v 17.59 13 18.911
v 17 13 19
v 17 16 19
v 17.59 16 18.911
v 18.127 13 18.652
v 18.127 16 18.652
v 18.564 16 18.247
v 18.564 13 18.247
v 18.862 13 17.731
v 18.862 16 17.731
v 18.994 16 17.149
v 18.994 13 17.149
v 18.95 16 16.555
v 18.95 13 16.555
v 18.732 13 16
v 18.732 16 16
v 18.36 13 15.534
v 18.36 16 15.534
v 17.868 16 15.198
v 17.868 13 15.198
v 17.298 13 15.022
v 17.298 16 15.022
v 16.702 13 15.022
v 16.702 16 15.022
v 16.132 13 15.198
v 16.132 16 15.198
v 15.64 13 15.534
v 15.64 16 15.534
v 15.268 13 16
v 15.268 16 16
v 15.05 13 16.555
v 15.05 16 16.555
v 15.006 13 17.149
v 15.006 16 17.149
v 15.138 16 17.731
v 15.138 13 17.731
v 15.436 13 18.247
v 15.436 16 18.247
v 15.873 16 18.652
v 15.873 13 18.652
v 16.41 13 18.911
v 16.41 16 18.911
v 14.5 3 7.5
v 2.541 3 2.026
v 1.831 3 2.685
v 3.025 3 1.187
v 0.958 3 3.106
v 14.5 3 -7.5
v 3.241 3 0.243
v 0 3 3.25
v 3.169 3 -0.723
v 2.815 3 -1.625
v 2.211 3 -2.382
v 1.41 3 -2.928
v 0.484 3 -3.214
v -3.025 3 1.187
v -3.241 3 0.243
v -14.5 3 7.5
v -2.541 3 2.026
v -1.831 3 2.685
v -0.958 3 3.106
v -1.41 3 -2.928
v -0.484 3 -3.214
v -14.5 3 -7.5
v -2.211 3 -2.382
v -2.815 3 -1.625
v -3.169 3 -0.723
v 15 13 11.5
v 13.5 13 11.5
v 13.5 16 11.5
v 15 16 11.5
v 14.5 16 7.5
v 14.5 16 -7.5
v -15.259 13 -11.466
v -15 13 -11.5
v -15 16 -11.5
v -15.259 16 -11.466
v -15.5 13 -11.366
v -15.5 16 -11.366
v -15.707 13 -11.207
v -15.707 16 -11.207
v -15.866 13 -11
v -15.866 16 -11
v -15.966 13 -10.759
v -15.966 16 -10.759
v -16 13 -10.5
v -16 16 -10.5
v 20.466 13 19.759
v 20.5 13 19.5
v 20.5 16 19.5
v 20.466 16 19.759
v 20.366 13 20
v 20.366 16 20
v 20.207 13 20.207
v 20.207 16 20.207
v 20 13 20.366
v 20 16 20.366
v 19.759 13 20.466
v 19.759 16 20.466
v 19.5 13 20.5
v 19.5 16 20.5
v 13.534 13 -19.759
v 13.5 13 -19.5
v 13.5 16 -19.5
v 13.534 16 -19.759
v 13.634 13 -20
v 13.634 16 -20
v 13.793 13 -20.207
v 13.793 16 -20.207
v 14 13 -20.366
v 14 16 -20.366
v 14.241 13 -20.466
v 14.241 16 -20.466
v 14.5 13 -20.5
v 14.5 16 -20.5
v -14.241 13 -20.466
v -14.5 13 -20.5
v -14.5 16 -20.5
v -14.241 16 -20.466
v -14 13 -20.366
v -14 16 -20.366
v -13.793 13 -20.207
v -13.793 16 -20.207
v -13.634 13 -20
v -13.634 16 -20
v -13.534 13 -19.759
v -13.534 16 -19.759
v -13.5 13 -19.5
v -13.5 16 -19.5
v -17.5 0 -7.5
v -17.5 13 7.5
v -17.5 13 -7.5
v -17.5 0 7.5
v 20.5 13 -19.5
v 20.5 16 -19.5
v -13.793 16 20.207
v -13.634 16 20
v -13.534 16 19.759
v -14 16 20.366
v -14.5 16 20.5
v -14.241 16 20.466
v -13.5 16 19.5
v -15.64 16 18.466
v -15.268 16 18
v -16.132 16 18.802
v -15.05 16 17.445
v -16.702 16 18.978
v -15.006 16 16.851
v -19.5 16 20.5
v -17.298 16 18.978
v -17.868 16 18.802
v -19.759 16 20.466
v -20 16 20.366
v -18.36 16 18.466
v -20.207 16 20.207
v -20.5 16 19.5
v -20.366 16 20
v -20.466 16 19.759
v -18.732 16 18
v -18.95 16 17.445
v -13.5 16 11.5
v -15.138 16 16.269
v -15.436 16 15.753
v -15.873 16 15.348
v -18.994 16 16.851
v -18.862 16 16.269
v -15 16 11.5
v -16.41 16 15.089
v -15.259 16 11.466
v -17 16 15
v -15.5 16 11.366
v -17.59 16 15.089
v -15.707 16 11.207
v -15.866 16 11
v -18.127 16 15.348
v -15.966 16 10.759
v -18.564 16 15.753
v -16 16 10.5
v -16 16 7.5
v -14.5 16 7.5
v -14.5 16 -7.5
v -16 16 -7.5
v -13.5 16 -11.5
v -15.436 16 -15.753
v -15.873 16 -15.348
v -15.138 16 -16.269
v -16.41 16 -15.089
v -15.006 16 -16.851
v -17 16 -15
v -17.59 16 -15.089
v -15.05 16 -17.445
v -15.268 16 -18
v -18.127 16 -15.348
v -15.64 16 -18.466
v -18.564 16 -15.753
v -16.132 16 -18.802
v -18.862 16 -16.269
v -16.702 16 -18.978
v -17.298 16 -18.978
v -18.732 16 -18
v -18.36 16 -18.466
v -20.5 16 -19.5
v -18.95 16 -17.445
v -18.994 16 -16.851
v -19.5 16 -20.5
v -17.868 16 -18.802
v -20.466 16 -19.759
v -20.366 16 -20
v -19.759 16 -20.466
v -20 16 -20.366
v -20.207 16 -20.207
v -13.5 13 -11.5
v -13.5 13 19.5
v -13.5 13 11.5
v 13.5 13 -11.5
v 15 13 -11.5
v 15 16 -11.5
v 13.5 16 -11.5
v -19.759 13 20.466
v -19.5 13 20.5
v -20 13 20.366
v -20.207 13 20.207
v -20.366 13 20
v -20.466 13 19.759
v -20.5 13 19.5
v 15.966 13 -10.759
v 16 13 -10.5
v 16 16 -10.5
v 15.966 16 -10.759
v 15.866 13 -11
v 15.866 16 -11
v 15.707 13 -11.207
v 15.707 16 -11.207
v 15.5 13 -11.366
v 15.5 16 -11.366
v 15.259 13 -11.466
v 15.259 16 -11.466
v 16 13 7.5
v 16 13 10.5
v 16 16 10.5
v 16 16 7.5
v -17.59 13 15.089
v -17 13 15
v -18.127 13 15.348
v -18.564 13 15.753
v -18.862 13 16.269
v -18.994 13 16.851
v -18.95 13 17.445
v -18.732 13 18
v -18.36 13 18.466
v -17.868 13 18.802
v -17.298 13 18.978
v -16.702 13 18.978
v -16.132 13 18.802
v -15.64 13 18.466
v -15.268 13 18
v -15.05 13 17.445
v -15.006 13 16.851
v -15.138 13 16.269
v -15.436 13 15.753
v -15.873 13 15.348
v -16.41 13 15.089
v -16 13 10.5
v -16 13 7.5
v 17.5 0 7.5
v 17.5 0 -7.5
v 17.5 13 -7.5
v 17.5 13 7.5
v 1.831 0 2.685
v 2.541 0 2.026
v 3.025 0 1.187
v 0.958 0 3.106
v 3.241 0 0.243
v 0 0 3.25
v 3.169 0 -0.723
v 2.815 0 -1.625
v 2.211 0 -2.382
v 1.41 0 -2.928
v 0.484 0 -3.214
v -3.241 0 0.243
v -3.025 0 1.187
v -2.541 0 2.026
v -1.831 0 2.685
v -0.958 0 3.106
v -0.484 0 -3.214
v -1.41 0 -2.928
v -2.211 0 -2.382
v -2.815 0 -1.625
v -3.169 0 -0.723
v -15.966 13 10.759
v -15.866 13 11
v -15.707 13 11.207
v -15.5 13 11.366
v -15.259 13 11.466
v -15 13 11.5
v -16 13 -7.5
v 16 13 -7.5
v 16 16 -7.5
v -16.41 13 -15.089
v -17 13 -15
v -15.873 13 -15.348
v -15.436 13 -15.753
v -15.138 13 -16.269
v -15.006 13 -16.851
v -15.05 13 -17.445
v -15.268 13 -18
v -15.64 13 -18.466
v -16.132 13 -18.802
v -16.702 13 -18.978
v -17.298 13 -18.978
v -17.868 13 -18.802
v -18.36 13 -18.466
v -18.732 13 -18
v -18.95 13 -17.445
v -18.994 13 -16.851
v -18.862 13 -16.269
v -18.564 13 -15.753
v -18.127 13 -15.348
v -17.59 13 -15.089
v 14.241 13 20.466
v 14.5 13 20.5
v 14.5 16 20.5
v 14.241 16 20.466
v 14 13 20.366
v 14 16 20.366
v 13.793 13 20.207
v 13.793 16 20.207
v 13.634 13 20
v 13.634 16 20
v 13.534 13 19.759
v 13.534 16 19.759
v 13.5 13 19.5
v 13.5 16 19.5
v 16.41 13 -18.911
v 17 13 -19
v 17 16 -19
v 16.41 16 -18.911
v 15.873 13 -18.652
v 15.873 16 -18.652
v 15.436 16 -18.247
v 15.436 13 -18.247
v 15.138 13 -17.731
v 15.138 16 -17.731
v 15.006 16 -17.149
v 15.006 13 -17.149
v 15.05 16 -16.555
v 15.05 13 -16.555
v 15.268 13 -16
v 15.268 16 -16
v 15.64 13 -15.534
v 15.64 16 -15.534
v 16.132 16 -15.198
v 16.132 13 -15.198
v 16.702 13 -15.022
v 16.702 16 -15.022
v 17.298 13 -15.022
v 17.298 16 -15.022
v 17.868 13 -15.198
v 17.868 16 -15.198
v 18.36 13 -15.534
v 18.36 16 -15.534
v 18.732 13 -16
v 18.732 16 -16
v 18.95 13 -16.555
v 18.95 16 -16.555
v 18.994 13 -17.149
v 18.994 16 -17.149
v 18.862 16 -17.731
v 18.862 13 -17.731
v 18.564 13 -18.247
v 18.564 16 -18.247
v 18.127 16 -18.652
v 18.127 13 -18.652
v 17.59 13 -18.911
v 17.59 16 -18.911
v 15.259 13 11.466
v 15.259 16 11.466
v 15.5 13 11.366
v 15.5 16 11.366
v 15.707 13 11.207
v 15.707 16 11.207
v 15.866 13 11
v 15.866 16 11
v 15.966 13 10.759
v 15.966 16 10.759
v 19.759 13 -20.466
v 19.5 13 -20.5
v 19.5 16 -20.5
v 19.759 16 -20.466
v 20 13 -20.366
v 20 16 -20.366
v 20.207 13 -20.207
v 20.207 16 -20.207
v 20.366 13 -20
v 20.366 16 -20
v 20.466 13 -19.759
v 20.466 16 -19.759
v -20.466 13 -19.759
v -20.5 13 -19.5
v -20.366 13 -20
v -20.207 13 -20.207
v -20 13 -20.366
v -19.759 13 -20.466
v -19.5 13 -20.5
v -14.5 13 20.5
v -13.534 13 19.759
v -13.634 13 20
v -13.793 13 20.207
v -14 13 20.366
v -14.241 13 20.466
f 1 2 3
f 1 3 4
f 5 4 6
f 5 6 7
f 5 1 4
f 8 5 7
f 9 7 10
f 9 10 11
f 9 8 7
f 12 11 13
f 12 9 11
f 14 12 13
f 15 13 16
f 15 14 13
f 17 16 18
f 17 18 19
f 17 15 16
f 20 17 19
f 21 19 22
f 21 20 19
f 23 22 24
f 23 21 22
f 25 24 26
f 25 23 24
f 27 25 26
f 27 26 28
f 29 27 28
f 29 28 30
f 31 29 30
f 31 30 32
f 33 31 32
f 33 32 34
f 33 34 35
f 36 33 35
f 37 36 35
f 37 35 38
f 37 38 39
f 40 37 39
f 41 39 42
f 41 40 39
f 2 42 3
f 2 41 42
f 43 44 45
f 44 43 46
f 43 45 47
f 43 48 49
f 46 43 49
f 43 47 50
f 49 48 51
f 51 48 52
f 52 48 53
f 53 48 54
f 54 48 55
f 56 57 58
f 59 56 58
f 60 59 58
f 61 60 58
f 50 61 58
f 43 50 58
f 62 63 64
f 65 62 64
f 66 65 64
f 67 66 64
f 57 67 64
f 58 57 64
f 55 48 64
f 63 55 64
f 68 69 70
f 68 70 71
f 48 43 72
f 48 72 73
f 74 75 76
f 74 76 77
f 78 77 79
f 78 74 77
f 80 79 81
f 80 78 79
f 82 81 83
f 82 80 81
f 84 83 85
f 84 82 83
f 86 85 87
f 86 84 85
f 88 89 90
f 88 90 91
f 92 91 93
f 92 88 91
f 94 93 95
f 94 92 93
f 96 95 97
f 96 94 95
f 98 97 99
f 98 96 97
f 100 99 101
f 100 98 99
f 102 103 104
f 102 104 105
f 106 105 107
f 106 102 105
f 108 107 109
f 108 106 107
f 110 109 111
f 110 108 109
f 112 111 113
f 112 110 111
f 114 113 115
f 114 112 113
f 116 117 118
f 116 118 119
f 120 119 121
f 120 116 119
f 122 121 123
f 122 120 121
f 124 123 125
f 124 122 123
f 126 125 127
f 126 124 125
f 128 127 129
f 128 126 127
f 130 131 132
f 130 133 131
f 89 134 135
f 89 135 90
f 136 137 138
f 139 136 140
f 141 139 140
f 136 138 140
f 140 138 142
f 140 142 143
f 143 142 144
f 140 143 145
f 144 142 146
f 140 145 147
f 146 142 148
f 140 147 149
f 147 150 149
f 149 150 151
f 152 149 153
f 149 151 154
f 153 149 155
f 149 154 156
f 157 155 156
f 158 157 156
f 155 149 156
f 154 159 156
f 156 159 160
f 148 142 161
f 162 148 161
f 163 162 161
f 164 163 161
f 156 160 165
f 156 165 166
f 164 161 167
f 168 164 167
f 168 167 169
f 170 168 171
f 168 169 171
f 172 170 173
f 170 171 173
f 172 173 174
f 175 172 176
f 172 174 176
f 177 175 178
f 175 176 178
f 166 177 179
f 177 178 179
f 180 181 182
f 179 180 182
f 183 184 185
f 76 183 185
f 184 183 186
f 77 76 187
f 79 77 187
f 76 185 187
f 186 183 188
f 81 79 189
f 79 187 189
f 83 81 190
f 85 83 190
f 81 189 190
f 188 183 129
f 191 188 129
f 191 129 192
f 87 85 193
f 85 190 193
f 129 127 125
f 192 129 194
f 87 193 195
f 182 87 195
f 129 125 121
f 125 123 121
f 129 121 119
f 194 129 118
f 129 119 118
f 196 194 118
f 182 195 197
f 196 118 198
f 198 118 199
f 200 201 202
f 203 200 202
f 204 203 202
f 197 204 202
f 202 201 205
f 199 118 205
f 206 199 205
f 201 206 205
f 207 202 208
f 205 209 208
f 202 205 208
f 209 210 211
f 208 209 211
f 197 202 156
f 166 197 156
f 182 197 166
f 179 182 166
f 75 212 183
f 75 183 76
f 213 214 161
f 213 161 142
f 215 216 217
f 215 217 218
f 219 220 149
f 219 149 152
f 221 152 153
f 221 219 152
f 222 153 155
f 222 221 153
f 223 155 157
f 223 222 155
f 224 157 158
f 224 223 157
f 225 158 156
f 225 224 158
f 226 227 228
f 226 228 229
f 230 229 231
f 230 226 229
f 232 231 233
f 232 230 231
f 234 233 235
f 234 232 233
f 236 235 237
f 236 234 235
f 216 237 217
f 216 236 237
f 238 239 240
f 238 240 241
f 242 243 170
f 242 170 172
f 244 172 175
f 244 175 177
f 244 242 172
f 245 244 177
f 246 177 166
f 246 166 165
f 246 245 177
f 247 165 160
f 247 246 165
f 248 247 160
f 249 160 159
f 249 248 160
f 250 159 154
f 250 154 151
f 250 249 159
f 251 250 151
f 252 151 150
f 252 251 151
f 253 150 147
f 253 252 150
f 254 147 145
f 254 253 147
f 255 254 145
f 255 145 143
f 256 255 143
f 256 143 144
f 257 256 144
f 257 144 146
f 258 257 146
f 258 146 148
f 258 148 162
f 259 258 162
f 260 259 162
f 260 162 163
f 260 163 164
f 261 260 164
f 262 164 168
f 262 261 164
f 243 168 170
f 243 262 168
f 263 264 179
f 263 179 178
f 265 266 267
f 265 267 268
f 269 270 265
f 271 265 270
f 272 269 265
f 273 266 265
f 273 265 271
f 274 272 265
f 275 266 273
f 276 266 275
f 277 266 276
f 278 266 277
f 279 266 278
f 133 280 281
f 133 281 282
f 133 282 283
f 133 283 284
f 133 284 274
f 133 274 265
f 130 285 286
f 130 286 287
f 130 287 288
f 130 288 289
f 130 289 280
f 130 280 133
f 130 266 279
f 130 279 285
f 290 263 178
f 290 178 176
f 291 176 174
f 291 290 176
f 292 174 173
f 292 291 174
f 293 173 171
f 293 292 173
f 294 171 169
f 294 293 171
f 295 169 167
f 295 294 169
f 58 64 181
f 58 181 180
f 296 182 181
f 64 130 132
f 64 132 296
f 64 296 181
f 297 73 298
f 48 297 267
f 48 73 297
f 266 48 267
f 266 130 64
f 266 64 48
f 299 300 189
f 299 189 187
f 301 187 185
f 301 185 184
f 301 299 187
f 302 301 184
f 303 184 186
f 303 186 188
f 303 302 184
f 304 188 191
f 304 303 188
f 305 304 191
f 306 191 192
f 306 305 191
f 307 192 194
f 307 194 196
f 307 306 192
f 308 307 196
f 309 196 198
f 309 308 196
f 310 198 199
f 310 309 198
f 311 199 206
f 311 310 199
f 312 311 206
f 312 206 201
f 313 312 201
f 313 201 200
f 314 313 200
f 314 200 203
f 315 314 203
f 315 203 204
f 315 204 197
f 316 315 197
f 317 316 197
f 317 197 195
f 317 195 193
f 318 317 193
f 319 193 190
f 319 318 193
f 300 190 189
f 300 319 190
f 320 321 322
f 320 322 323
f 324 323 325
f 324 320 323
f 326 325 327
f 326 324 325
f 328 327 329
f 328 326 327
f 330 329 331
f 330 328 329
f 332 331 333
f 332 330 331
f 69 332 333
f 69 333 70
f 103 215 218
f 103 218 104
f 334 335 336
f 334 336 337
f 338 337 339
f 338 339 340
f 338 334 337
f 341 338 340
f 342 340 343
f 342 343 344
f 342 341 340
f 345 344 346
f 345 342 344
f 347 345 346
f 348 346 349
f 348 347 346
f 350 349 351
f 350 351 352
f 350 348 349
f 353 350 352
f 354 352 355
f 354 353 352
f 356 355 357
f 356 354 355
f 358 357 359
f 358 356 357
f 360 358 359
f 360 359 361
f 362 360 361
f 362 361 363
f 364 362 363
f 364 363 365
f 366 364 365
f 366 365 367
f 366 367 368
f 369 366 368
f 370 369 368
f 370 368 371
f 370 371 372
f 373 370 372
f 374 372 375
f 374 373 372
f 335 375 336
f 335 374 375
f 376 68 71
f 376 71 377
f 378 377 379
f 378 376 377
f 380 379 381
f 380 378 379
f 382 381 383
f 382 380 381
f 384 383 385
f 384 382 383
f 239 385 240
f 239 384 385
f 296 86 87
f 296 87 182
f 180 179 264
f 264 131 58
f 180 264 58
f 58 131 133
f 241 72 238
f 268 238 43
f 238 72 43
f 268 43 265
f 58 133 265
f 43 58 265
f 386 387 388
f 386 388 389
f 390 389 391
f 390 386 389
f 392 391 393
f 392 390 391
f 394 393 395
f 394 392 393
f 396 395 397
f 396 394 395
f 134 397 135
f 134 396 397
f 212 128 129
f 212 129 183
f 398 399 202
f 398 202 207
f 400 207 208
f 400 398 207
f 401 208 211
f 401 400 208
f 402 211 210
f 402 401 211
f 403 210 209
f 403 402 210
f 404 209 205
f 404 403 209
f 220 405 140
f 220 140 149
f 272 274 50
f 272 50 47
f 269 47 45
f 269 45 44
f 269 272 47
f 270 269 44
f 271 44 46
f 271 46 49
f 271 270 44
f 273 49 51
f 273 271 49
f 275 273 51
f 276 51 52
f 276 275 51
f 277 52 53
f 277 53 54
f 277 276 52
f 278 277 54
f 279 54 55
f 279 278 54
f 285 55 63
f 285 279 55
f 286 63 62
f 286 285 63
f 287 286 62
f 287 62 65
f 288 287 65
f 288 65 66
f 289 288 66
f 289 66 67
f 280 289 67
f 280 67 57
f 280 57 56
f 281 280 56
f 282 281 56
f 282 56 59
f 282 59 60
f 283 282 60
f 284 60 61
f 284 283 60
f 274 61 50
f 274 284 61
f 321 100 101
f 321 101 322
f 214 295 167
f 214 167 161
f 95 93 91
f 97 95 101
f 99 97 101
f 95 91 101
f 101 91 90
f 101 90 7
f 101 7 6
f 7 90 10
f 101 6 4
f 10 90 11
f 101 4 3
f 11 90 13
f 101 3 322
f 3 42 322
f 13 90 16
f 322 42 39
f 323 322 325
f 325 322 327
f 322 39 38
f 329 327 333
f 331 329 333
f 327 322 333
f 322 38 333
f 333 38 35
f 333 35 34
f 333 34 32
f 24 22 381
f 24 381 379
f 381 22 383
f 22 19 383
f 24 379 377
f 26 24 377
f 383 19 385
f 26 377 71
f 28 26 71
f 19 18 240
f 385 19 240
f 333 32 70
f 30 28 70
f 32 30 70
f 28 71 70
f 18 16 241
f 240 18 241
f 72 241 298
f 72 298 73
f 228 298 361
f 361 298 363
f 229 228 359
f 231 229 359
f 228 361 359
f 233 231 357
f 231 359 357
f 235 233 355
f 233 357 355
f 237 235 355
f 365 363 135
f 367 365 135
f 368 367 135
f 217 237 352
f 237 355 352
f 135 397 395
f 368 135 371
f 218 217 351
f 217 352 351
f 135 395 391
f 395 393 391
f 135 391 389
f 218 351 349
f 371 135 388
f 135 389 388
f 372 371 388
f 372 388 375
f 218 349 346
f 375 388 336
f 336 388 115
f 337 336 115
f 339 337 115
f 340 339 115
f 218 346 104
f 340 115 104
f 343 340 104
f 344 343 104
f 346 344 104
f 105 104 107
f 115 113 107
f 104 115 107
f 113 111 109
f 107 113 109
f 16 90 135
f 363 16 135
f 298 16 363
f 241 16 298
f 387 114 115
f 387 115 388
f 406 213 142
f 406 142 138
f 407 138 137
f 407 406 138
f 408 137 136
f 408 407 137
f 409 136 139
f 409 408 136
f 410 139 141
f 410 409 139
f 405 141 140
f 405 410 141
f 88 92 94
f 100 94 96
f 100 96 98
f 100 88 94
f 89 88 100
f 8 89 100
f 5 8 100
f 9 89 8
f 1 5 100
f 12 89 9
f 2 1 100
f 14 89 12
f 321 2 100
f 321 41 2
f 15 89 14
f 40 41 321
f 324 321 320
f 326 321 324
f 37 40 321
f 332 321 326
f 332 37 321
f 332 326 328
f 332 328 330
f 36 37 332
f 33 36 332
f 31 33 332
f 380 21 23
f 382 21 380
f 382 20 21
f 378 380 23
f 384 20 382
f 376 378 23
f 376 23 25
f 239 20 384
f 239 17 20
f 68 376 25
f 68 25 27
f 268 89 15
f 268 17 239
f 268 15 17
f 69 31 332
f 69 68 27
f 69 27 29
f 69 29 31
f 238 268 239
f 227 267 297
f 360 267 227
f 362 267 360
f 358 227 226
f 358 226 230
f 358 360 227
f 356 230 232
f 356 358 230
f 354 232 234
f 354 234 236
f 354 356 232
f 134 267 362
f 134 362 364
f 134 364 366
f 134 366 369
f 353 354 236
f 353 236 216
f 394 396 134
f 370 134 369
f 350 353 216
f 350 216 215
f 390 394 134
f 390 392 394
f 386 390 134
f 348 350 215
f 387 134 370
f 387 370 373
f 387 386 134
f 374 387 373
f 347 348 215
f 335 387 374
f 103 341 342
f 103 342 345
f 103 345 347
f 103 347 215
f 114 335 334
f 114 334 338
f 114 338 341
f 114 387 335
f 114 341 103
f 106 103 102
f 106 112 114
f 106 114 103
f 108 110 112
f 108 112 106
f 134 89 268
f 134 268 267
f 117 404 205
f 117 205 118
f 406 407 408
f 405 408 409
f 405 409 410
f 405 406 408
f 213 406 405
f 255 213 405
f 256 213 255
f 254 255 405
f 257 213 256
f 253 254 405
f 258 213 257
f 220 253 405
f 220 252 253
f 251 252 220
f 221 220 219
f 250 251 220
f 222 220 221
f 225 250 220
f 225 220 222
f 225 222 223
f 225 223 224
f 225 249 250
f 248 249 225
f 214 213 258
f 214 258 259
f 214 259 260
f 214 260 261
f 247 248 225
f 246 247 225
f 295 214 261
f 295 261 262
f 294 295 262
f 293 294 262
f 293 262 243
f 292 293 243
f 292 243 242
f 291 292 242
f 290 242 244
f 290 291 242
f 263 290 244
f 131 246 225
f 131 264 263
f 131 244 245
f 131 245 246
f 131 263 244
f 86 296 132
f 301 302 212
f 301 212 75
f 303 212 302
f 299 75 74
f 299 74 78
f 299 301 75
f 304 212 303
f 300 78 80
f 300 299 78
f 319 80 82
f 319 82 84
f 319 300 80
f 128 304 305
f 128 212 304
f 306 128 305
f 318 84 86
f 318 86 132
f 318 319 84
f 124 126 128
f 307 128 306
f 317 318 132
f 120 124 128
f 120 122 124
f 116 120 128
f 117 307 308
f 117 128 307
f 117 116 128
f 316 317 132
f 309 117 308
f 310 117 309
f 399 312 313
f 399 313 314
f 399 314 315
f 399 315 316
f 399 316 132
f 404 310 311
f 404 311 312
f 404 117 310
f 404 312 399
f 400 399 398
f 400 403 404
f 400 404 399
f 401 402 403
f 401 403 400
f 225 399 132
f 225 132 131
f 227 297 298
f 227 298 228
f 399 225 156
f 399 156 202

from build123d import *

# Parameters (mm, degrees)
SKETCH_1_R      = 3.25
EXTRUDE_1_DEPTH = 3
SKETCH_2_W      = 3
SKETCH_2_H      = 15
EXTRUDE_2_DEPTH = 10
SKETCH_3_R      = 2
EXTRUDE_3_DEPTH = 3


with BuildPart() as part:
    # 草图1 → 凸台-拉伸1 (new body)
    with BuildSketch(Plane(origin=(0, 0, 0), x_dir=(1, 0, 0), z_dir=(0, 1, 0))):
        Polygon((-12.5, 7.5), (12.5, 7.5), (17.5, 7.5), (17.5, -7.5), (12.5, -7.5), (-12.5, -7.5), (-17.5, -7.5), (-17.5, 7.5), align=None)
        with Locations(Location((0, 0, 0), (0, 0, 270))):
            Circle(SKETCH_1_R, mode=Mode.SUBTRACT)
    extrude(amount=EXTRUDE_1_DEPTH)

    # 草图2 → 凸台-拉伸2 (add)
    with BuildSketch(Plane(origin=(0, 3, 0), x_dir=(1, 0, 0), z_dir=(0, 1, 0))):
        with Locations((-16, 0)):
            Rectangle(SKETCH_2_W, SKETCH_2_H)
        with Locations((16, 0)):
            Rectangle(SKETCH_2_W, SKETCH_2_H)
    extrude(amount=EXTRUDE_2_DEPTH)

    # 草图3 → 凸台-拉伸3 (add)
    # profile 1 of 2: a face of its own
    with BuildSketch(Plane(origin=(0, 13, 0), x_dir=(1, 0, 0), z_dir=(0, 1, 0))):
        with BuildLine():
            Line((-15, -11.5), (-13.5, -11.5))
            Line((-13.5, -11.5), (-13.5, -17.5))
            Line((-13.5, -17.5), (-13.5, -19.5))
            ThreePointArc((-13.5, -19.5), (-13.792893219, -20.207106781), (-14.5, -20.5))
            Line((-14.5, -20.5), (-19.5, -20.5))
            ThreePointArc((-19.5, -20.5), (-20.207106781, -20.207106781), (-20.5, -19.5))
            Line((-20.5, -19.5), (-20.5, 19.5))
            ThreePointArc((-20.5, 19.5), (-20.207106781, 20.207106781), (-19.5, 20.5))
            Line((-19.5, 20.5), (-14.5, 20.5))
            ThreePointArc((-14.5, 20.5), (-13.792893219, 20.207106781), (-13.5, 19.5))
            Line((-13.5, 19.5), (-13.5, 18.5))
            Line((-13.5, 18.5), (-13.5, 11.5))
            Line((-13.5, 11.5), (-15, 11.5))
            ThreePointArc((-15, 11.5), (-15.707106781, 11.207106781), (-16, 10.5))
            Line((-16, 10.5), (-16, 7.5))
            Line((-16, 7.5), (-14.5, 7.5))
            Line((-14.5, 7.5), (-14.5, -7.5))
            Line((-14.5, -7.5), (-16, -7.5))
            Line((-16, -7.5), (-16, -10.5))
            ThreePointArc((-16, -10.5), (-15.707106781, -11.207106781), (-15, -11.5))
        make_face()
        with Locations(Location((-17, 17, 0), (0, 0, 270))):
            Circle(SKETCH_3_R, mode=Mode.SUBTRACT)
        with Locations(Location((-17, -17, 0), (0, 0, 90))):
            Circle(SKETCH_3_R, mode=Mode.SUBTRACT)
    # profile 2 of 2: a face of its own
    with BuildSketch(Plane(origin=(0, 13, 0), x_dir=(1, 0, 0), z_dir=(0, 1, 0))):
        with BuildLine():
            Line((14.5, 7.5), (16, 7.5))
            Line((16, 7.5), (16, 10.5))
            ThreePointArc((16, 10.5), (15.707106781, 11.207106781), (15, 11.5))
            Line((15, 11.5), (13.5, 11.5))
            Line((13.5, 11.5), (13.5, 18.5))
            Line((13.5, 18.5), (13.5, 19.5))
            ThreePointArc((13.5, 19.5), (13.792893219, 20.207106781), (14.5, 20.5))
            Line((14.5, 20.5), (19.5, 20.5))
            ThreePointArc((19.5, 20.5), (20.207106781, 20.207106781), (20.5, 19.5))
            Line((20.5, 19.5), (20.5, -19.5))
            ThreePointArc((20.5, -19.5), (20.207106781, -20.207106781), (19.5, -20.5))
            Line((19.5, -20.5), (14.5, -20.5))
            ThreePointArc((14.5, -20.5), (13.792893219, -20.207106781), (13.5, -19.5))
            Line((13.5, -19.5), (13.5, -18.5))
            Line((13.5, -18.5), (13.5, -11.5))
            Line((13.5, -11.5), (15, -11.5))
            ThreePointArc((15, -11.5), (15.707106781, -11.207106781), (16, -10.5))
            Line((16, -10.5), (16, -7.5))
            Line((16, -7.5), (14.5, -7.5))
            Line((14.5, -7.5), (14.5, 7.5))
        make_face()
        with Locations(Location((17, 17, 0), (0, 0, 90))):
            Circle(SKETCH_3_R, mode=Mode.SUBTRACT)
        with Locations(Location((17, -17, 0), (0, 0, 270))):
            Circle(SKETCH_3_R, mode=Mode.SUBTRACT)
    extrude(amount=EXTRUDE_3_DEPTH)


solid = part.part
